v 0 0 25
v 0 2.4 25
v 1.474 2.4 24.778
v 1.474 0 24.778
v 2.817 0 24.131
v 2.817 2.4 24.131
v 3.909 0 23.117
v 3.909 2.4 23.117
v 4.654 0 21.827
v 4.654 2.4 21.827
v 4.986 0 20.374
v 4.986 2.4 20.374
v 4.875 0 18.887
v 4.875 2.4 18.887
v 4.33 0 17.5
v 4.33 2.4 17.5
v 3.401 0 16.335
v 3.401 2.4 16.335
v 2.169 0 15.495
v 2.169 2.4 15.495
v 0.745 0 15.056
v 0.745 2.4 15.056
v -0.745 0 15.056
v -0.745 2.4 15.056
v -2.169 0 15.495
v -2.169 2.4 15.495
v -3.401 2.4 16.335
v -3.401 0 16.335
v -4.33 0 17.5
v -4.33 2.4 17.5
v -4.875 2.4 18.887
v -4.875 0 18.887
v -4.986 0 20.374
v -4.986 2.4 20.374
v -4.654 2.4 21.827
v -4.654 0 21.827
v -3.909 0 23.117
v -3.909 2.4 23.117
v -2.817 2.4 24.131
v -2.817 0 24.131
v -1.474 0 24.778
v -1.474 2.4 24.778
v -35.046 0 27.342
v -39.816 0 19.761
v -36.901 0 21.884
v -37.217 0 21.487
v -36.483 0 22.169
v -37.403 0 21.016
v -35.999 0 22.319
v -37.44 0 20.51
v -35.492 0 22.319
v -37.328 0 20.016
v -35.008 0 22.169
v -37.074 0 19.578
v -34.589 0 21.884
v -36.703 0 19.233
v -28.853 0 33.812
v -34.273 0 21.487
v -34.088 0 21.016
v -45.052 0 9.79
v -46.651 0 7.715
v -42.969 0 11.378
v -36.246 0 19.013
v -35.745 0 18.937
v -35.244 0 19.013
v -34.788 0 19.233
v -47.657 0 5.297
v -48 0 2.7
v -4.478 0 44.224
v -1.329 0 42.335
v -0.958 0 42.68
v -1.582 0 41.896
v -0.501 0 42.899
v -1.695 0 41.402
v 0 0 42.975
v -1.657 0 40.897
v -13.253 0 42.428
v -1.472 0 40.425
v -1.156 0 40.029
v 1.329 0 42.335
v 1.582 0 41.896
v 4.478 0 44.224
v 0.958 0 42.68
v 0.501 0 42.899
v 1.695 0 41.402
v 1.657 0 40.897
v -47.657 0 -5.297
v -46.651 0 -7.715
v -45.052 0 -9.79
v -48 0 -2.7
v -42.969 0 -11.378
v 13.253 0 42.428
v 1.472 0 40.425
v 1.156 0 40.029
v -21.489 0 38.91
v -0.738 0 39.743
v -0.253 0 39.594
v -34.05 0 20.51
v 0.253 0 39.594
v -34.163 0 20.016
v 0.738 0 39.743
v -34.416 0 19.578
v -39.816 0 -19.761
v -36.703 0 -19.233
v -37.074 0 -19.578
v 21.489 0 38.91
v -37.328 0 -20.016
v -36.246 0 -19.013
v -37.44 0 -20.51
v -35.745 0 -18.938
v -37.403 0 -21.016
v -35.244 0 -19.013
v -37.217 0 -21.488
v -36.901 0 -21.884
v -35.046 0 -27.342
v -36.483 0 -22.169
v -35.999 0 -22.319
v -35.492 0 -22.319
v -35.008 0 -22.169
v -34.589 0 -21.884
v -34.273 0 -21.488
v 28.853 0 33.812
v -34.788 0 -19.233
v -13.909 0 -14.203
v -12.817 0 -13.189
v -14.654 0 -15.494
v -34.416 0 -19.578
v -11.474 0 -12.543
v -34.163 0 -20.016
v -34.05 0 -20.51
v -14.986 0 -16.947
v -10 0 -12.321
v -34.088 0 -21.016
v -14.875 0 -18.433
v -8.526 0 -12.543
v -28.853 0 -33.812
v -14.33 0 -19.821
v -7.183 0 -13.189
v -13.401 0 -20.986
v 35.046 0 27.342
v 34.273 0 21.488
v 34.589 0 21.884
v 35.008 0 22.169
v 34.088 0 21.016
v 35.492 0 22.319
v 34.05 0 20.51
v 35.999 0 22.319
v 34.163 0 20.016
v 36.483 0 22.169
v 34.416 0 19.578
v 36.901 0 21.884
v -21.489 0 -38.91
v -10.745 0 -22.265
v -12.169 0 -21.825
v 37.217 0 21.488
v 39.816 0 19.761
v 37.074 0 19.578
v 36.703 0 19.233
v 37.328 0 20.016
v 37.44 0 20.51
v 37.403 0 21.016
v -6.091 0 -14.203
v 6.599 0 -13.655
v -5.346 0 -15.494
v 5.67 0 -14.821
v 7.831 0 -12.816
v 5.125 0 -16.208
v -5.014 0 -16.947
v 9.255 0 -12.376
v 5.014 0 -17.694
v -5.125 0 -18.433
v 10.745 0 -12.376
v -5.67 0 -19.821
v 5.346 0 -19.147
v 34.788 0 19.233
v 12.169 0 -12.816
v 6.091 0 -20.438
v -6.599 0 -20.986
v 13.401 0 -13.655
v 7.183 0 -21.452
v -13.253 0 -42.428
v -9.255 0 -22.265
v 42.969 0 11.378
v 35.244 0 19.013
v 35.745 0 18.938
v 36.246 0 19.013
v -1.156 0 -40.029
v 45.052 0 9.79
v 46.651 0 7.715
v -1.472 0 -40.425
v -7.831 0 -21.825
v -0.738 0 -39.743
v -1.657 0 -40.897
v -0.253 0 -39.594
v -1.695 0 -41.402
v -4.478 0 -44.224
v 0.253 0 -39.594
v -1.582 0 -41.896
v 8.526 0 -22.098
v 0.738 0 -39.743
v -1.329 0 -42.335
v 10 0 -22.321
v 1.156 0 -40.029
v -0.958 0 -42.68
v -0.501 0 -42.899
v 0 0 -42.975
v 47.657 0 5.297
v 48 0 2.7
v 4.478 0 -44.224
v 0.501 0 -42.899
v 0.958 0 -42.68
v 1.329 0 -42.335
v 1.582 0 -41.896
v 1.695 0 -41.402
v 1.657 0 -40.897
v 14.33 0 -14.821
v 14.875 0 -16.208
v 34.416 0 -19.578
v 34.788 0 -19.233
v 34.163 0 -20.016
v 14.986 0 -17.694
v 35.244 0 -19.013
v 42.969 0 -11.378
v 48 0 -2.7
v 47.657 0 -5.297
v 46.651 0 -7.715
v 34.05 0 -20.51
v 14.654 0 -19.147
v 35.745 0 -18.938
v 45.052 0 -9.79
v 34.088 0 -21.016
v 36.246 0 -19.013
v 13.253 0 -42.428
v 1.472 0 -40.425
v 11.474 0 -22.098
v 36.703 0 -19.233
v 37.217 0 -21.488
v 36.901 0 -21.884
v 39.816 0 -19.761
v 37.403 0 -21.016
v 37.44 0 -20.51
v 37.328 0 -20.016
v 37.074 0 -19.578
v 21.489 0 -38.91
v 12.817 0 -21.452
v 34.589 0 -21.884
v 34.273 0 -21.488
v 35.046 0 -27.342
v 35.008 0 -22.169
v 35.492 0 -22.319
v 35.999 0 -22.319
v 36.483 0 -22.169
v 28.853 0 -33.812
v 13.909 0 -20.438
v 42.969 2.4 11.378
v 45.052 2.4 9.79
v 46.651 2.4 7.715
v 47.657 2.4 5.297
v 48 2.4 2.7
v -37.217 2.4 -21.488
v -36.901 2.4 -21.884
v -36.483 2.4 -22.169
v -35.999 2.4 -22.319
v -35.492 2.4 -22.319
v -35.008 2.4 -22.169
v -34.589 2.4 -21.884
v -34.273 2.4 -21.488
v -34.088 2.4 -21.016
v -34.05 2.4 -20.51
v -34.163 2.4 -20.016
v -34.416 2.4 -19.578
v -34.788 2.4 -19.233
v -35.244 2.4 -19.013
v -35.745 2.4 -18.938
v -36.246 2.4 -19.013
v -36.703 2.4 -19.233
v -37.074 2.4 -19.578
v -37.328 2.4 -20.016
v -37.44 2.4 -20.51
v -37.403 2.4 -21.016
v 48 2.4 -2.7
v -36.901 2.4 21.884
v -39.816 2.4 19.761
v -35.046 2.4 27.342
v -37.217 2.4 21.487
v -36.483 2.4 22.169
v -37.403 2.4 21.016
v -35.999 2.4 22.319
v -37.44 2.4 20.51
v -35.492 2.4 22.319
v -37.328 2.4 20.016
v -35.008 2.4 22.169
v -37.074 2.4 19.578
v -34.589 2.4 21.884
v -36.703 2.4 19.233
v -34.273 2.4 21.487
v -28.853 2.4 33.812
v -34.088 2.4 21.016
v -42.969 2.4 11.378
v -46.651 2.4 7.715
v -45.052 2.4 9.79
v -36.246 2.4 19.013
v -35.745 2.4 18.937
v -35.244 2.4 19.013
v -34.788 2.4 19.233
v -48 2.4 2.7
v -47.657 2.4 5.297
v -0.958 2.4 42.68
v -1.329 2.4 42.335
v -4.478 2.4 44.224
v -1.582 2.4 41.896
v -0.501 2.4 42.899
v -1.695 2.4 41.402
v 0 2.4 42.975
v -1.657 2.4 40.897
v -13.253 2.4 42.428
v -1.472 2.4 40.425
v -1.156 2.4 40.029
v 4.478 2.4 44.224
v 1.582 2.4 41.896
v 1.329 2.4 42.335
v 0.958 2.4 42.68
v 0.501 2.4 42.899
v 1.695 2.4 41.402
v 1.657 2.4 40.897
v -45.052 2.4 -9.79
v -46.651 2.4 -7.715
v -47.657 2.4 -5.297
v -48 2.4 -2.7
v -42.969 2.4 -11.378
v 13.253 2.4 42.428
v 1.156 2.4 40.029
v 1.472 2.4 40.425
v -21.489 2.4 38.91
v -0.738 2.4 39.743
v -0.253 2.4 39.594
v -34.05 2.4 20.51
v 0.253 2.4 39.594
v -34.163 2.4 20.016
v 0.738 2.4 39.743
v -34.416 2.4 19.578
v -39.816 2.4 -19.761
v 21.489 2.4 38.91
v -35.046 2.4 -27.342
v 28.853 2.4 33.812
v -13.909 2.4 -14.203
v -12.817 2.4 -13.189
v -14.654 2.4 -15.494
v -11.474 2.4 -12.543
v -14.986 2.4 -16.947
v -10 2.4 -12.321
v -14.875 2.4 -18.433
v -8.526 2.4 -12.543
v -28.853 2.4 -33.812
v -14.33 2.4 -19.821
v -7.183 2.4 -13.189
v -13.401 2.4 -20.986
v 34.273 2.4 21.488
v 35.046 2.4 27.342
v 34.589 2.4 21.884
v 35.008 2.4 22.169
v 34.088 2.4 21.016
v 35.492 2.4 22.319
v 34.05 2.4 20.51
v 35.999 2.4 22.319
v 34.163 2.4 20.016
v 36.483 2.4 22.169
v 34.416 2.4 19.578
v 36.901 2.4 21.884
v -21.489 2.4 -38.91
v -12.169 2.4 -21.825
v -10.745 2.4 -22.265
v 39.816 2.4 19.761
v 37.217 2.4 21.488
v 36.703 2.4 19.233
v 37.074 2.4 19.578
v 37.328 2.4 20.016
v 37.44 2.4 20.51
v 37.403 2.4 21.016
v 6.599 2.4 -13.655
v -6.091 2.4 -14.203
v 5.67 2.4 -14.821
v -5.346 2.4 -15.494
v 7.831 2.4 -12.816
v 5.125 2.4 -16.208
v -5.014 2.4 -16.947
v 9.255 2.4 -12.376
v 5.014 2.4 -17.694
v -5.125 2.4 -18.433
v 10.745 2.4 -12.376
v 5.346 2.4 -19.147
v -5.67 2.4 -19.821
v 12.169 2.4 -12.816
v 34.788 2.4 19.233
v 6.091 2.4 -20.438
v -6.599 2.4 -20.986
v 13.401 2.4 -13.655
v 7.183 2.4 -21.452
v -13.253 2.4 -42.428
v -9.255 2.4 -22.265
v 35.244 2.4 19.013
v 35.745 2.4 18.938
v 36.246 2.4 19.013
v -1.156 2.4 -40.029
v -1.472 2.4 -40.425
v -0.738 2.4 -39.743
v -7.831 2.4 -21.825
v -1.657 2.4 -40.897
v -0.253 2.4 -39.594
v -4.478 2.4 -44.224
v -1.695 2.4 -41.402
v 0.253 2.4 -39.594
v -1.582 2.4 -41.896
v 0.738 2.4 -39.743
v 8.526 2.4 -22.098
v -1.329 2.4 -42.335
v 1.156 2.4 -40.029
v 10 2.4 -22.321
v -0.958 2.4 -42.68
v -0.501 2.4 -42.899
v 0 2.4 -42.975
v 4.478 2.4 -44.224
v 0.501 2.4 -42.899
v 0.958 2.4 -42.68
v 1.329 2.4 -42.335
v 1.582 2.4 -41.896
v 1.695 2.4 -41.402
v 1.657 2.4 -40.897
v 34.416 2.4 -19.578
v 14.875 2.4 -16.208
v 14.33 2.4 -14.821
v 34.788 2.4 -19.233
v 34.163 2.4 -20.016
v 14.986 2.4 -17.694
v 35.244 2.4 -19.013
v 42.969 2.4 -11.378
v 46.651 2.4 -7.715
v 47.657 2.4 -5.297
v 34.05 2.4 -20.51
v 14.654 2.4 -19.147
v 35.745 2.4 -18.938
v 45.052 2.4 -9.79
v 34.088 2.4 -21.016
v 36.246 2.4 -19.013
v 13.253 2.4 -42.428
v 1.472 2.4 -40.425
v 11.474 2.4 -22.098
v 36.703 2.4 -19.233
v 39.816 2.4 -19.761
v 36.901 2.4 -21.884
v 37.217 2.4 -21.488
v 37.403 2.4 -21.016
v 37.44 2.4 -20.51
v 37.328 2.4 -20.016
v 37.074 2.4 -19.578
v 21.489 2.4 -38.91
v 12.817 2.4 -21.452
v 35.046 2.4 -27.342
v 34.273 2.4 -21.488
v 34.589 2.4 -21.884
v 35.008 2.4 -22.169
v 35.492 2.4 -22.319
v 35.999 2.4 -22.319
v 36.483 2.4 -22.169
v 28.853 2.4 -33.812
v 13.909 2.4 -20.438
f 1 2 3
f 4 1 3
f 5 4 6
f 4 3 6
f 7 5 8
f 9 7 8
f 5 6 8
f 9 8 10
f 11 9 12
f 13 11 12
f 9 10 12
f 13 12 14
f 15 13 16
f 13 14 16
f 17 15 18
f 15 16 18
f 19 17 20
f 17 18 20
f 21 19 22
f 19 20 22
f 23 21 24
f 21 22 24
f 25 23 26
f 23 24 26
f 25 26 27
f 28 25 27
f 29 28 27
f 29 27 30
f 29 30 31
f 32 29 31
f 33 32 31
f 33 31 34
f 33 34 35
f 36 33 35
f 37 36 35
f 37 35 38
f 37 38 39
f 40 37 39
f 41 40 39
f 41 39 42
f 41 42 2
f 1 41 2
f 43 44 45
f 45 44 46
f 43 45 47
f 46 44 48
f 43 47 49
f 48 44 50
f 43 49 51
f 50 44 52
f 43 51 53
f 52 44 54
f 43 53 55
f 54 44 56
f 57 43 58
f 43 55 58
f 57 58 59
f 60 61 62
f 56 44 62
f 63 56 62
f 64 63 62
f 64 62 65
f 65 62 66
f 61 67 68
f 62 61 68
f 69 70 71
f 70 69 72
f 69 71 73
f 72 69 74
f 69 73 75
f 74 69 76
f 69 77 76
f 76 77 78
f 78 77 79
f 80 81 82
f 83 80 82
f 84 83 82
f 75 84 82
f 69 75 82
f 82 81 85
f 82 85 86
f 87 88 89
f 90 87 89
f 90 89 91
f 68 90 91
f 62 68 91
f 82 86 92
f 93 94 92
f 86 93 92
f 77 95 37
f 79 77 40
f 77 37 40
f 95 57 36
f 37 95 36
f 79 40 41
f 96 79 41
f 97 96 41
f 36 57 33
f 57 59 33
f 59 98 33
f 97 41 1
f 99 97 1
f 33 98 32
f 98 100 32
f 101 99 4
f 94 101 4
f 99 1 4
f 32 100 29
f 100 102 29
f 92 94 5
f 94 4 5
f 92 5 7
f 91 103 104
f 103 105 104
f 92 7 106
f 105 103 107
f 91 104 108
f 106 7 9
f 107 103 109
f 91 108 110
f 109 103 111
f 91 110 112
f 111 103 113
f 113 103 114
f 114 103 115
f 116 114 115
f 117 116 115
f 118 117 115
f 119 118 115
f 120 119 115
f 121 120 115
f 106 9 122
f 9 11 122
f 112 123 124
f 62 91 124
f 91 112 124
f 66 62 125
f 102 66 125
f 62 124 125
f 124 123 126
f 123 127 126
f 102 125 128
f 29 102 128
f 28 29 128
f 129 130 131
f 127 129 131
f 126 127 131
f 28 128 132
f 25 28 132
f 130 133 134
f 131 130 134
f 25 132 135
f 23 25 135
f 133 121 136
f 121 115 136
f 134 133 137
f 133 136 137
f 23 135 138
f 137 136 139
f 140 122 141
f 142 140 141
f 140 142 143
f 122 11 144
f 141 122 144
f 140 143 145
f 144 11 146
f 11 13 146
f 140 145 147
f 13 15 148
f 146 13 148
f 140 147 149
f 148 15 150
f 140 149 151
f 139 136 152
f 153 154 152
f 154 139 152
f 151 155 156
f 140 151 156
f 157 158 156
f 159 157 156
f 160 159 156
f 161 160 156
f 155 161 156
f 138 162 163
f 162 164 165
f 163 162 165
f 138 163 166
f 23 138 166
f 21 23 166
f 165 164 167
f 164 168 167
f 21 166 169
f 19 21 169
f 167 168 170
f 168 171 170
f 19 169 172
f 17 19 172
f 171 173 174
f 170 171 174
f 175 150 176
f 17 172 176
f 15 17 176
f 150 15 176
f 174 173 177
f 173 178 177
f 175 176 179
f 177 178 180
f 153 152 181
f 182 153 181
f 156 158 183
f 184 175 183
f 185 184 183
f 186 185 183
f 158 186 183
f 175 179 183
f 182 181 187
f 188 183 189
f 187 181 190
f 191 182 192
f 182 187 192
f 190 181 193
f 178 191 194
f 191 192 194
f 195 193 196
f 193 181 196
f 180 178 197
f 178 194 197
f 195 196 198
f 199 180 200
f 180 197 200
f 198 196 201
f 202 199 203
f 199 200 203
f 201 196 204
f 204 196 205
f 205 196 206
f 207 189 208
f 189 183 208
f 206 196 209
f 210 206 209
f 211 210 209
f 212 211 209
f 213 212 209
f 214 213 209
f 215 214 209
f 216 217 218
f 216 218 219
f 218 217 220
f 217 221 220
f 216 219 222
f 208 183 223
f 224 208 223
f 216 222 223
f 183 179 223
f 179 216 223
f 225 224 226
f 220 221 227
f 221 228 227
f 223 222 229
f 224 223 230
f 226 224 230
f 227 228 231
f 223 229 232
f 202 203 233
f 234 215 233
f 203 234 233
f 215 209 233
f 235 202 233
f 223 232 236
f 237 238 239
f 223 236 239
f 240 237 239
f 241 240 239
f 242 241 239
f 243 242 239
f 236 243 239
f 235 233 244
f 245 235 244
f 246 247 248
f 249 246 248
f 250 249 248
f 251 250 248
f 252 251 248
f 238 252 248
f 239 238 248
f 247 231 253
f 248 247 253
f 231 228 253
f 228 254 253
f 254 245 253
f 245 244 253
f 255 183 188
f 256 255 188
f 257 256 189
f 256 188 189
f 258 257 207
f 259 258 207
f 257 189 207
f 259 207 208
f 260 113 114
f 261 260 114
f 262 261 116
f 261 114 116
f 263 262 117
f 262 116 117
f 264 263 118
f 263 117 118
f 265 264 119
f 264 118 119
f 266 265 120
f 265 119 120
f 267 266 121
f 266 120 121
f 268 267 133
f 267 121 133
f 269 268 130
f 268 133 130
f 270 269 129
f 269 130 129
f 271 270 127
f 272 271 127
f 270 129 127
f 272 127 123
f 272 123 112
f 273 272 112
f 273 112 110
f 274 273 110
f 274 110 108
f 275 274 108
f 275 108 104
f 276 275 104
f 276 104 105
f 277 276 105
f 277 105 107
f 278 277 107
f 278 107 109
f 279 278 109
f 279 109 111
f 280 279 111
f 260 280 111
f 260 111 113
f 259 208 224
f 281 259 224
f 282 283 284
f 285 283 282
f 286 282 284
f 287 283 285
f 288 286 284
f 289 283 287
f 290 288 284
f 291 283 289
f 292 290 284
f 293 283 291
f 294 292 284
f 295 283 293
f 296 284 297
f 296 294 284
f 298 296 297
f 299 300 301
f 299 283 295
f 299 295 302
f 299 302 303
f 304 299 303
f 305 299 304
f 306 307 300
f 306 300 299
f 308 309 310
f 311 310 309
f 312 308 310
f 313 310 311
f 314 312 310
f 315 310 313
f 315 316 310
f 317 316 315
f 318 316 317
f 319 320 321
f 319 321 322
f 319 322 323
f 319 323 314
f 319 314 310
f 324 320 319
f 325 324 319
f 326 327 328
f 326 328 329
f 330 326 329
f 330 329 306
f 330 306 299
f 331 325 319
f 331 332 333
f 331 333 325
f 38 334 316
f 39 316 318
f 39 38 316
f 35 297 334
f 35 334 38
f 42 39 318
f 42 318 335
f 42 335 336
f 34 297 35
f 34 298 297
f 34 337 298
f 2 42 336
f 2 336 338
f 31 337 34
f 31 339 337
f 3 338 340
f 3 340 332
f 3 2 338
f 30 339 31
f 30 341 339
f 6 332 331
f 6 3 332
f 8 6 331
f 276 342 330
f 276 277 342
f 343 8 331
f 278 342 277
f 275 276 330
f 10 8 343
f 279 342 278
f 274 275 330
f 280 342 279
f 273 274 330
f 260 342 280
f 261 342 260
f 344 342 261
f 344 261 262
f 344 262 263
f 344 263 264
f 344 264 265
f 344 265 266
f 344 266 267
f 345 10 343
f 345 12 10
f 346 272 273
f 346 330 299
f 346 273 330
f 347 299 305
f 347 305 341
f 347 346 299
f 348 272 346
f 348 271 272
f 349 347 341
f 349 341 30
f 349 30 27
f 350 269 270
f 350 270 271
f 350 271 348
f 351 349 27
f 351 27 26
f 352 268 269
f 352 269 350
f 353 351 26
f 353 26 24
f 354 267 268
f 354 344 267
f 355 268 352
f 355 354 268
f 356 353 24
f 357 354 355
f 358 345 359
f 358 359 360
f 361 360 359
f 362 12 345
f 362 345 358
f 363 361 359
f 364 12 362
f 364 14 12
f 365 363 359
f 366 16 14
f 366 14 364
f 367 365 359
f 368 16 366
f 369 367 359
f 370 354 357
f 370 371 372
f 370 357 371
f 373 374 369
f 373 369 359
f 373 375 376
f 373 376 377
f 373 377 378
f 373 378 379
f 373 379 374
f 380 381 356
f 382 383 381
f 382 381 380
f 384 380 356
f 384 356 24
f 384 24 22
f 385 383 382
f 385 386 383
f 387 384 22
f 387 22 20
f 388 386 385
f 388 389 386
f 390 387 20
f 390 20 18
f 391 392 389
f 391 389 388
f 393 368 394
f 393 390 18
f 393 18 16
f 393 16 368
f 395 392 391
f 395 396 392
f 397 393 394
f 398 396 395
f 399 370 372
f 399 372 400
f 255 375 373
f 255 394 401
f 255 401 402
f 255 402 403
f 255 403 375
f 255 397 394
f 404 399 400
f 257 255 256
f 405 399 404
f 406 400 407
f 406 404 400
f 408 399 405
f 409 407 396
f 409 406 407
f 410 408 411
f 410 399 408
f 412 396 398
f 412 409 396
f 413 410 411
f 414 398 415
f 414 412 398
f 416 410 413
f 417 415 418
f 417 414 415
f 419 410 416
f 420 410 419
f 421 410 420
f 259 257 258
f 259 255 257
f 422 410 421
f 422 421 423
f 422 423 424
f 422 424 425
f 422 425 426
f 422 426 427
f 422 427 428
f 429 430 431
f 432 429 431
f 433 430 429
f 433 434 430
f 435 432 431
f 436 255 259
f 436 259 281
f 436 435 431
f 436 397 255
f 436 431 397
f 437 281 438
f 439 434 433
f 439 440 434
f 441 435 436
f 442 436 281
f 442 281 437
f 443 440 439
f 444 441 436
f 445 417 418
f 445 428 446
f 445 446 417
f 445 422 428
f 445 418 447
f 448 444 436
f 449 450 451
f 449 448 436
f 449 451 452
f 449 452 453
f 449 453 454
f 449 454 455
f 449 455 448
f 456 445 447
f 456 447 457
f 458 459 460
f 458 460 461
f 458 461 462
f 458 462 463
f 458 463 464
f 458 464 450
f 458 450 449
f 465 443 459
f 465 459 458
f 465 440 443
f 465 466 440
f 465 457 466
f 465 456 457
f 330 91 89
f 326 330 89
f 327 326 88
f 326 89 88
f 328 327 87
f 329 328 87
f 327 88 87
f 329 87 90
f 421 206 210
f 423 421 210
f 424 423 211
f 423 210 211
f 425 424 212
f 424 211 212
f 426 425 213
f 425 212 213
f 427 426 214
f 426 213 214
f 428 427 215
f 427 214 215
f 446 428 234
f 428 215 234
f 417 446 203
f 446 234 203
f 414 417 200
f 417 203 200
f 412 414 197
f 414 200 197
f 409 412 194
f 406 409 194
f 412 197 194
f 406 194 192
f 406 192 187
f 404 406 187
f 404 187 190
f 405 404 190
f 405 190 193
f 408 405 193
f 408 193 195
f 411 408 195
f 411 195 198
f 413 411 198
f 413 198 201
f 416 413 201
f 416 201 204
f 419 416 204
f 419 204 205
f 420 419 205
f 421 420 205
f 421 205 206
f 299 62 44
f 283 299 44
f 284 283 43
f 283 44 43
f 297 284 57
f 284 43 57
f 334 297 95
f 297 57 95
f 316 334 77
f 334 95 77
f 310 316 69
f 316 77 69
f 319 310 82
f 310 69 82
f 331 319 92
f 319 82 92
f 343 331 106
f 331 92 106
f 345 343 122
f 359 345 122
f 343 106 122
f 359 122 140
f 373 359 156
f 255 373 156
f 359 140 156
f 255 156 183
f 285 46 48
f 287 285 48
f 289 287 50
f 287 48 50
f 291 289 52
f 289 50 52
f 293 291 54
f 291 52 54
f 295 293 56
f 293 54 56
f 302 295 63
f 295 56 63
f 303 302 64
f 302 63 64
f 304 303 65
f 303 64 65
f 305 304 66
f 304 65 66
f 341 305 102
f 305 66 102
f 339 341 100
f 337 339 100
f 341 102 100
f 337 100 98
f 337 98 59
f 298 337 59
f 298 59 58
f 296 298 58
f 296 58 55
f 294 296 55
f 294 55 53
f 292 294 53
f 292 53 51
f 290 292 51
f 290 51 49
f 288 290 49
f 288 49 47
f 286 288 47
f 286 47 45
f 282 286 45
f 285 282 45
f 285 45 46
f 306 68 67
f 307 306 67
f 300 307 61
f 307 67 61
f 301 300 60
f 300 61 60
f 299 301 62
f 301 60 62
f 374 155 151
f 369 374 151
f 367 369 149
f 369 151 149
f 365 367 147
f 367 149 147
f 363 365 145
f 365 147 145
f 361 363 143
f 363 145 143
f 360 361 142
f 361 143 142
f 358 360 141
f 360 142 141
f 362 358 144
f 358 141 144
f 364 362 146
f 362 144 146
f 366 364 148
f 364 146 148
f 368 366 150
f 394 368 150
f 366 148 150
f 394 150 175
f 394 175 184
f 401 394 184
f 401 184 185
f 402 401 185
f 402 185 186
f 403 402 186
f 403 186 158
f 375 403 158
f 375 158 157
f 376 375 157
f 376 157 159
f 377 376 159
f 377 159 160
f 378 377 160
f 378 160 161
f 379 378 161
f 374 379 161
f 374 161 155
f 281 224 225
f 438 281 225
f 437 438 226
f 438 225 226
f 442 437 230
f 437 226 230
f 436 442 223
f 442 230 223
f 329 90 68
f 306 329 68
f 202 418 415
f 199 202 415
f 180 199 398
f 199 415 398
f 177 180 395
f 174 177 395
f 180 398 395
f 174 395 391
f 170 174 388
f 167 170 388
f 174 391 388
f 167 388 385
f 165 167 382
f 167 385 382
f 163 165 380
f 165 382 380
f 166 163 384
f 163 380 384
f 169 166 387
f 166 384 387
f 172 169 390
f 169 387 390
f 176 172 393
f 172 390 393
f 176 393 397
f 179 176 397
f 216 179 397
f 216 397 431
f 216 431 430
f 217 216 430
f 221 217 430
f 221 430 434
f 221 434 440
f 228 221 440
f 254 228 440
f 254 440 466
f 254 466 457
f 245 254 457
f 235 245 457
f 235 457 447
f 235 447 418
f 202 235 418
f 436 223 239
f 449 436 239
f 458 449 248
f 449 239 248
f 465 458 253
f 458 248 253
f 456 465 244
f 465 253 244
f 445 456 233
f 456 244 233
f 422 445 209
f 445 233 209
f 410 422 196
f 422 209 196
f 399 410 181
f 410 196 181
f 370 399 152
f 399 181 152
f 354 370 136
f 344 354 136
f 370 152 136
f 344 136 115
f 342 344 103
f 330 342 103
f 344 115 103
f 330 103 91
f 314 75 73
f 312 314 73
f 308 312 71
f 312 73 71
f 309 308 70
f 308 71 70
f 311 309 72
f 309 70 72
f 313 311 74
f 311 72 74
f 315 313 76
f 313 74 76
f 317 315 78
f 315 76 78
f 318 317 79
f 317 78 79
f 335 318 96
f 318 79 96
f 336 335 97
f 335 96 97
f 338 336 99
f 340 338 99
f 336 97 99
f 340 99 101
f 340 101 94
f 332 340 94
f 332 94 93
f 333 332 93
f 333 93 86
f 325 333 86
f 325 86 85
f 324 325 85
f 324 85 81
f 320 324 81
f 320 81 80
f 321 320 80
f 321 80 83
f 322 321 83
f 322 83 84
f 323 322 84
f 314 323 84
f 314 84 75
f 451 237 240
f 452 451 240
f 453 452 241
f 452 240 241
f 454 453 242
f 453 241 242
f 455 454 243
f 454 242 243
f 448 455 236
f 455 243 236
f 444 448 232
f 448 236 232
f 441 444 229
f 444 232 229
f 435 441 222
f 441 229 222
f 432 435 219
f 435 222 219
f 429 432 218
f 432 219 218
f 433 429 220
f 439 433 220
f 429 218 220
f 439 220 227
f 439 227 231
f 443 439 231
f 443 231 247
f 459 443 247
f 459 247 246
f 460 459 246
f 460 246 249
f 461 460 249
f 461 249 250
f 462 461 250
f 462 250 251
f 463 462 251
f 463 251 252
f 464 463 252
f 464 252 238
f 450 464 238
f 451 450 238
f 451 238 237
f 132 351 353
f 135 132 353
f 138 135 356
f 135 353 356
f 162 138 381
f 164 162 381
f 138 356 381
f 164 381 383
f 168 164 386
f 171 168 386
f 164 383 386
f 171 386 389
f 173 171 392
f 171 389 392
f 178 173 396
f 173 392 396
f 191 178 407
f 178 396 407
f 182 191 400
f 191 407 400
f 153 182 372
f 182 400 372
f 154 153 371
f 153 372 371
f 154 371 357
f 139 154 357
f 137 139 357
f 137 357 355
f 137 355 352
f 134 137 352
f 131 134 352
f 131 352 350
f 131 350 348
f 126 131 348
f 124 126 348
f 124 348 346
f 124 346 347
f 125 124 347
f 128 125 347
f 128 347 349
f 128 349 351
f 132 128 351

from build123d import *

# Parameters (mm, degrees)
BOSS_EXTRUDE1_DEPTH  = 2.4
M3_CLEARANCE_HOLE1_D = 3.4
CIRPATTERN1_COUNT    = 6
SKETCH8_R            = 5
CUT_EXTRUDE2_DEPTH   = 66.464207778


with BuildPart() as part:
    # Sketch1 → Boss-Extrude1 (new body)
    with BuildSketch(Plane(origin=(0, 0, 0), x_dir=(1, 0, 0), z_dir=(0, 1, 0))):
        with BuildLine():
            ThreePointArc((-42.969094344, -11.378024049), (-44.45, 0), (-42.969094344, 11.378024049))
            ThreePointArc((-42.969094344, 11.378024049), (-46.651327743, 7.715429023), (-48, 2.7))
            Line((-48, 2.7), (-48, -2.7))
            ThreePointArc((-48, -2.7), (-46.651327743, -7.715429023), (-42.969094344, -11.378024049))
        make_face()
        with BuildLine():
            Line((38, 12.7), (-38, 12.7))
            ThreePointArc((-38, 12.7), (-40.570968641, 12.363856386), (-42.969094344, 11.378024049))
            ThreePointArc((-42.969094344, 11.378024049), (-44.45, 0), (-42.969094344, -11.378024049))
            ThreePointArc((-42.969094344, -11.378024049), (-40.570968641, -12.363856386), (-38, -12.7))
            Line((-38, -12.7), (38, -12.7))
            ThreePointArc((38, -12.7), (40.570968641, -12.363856386), (42.969094344, -11.378024049))
            ThreePointArc((42.969094344, -11.378024049), (44.078218791, -5.736996445), (44.45, 0))
            ThreePointArc((44.45, 0), (44.078218791, 5.736996445), (42.969094344, 11.378024049))
            ThreePointArc((42.969094344, 11.378024049), (40.570968641, 12.363856386), (38, 12.7))
        make_face()
        with BuildLine():
            ThreePointArc((-38, -12.7), (-40.570968641, -12.363856386), (-42.969094344, -11.378024049))
            ThreePointArc((-42.969094344, -11.378024049), (0, -44.45), (42.969094344, -11.378024049))
            ThreePointArc((42.969094344, -11.378024049), (40.570968641, -12.363856386), (38, -12.7))
            Line((38, -12.7), (-38, -12.7))
        make_face()
        with BuildLine():
            ThreePointArc((-42.969094344, 11.378024049), (-40.570968641, 12.363856386), (-38, 12.7))
            Line((-38, 12.7), (38, 12.7))
            ThreePointArc((38, 12.7), (40.570968641, 12.363856386), (42.969094344, 11.378024049))
            ThreePointArc((42.969094344, 11.378024049), (0, 44.45), (-42.969094344, 11.378024049))
        make_face()
        with BuildLine():
            ThreePointArc((48, 2.7), (46.651327743, 7.715429023), (42.969094344, 11.378024049))
            ThreePointArc((42.969094344, 11.378024049), (44.078218791, 5.736996445), (44.45, 0))
            ThreePointArc((44.45, 0), (44.078218791, -5.736996445), (42.969094344, -11.378024049))
            ThreePointArc((42.969094344, -11.378024049), (46.651327743, -7.715429023), (48, -2.7))
            Line((48, -2.7), (48, 2.7))
        make_face()
    extrude(amount=BOSS_EXTRUDE1_DEPTH)

    # M3 Clearance Hole1 (through all)
    with Locations(Plane(origin=(0, 2.4, -41.275), x_dir=(0, 0, 1), z_dir=(0, 1, 0))):
        with Locations((0, 0)):
            m3_clearance_hole1 = Hole(M3_CLEARANCE_HOLE1_D / 2)

    # CirPattern1: M3 Clearance Hole1 ×6 about axis
    cirpattern1_axis = Axis((0, 0, 0), (0, 1, 0))
    for i in range(1, CIRPATTERN1_COUNT):
        add(m3_clearance_hole1.rotate(cirpattern1_axis, i * 360 / CIRPATTERN1_COUNT), mode=Mode.SUBTRACT)

    # Sketch8 → Cut-Extrude2 (cut, through all)
    with BuildSketch(Plane(origin=(0, 2.4, 0), x_dir=(1, 0, 0), z_dir=(0, 1, 0))):
        with Locations(Location((-10, 17.320508076, 0), (0, 0, 270))):
            Circle(SKETCH8_R)
        with Locations(Location((10, 17.320508076, 0), (0, 0, 90))):
            Circle(SKETCH8_R)
        with Locations(Location((0, -20, 0), (0, 0, 270))):
            Circle(SKETCH8_R)
    extrude(amount=-CUT_EXTRUDE2_DEPTH, mode=Mode.SUBTRACT)


solid = part.part
